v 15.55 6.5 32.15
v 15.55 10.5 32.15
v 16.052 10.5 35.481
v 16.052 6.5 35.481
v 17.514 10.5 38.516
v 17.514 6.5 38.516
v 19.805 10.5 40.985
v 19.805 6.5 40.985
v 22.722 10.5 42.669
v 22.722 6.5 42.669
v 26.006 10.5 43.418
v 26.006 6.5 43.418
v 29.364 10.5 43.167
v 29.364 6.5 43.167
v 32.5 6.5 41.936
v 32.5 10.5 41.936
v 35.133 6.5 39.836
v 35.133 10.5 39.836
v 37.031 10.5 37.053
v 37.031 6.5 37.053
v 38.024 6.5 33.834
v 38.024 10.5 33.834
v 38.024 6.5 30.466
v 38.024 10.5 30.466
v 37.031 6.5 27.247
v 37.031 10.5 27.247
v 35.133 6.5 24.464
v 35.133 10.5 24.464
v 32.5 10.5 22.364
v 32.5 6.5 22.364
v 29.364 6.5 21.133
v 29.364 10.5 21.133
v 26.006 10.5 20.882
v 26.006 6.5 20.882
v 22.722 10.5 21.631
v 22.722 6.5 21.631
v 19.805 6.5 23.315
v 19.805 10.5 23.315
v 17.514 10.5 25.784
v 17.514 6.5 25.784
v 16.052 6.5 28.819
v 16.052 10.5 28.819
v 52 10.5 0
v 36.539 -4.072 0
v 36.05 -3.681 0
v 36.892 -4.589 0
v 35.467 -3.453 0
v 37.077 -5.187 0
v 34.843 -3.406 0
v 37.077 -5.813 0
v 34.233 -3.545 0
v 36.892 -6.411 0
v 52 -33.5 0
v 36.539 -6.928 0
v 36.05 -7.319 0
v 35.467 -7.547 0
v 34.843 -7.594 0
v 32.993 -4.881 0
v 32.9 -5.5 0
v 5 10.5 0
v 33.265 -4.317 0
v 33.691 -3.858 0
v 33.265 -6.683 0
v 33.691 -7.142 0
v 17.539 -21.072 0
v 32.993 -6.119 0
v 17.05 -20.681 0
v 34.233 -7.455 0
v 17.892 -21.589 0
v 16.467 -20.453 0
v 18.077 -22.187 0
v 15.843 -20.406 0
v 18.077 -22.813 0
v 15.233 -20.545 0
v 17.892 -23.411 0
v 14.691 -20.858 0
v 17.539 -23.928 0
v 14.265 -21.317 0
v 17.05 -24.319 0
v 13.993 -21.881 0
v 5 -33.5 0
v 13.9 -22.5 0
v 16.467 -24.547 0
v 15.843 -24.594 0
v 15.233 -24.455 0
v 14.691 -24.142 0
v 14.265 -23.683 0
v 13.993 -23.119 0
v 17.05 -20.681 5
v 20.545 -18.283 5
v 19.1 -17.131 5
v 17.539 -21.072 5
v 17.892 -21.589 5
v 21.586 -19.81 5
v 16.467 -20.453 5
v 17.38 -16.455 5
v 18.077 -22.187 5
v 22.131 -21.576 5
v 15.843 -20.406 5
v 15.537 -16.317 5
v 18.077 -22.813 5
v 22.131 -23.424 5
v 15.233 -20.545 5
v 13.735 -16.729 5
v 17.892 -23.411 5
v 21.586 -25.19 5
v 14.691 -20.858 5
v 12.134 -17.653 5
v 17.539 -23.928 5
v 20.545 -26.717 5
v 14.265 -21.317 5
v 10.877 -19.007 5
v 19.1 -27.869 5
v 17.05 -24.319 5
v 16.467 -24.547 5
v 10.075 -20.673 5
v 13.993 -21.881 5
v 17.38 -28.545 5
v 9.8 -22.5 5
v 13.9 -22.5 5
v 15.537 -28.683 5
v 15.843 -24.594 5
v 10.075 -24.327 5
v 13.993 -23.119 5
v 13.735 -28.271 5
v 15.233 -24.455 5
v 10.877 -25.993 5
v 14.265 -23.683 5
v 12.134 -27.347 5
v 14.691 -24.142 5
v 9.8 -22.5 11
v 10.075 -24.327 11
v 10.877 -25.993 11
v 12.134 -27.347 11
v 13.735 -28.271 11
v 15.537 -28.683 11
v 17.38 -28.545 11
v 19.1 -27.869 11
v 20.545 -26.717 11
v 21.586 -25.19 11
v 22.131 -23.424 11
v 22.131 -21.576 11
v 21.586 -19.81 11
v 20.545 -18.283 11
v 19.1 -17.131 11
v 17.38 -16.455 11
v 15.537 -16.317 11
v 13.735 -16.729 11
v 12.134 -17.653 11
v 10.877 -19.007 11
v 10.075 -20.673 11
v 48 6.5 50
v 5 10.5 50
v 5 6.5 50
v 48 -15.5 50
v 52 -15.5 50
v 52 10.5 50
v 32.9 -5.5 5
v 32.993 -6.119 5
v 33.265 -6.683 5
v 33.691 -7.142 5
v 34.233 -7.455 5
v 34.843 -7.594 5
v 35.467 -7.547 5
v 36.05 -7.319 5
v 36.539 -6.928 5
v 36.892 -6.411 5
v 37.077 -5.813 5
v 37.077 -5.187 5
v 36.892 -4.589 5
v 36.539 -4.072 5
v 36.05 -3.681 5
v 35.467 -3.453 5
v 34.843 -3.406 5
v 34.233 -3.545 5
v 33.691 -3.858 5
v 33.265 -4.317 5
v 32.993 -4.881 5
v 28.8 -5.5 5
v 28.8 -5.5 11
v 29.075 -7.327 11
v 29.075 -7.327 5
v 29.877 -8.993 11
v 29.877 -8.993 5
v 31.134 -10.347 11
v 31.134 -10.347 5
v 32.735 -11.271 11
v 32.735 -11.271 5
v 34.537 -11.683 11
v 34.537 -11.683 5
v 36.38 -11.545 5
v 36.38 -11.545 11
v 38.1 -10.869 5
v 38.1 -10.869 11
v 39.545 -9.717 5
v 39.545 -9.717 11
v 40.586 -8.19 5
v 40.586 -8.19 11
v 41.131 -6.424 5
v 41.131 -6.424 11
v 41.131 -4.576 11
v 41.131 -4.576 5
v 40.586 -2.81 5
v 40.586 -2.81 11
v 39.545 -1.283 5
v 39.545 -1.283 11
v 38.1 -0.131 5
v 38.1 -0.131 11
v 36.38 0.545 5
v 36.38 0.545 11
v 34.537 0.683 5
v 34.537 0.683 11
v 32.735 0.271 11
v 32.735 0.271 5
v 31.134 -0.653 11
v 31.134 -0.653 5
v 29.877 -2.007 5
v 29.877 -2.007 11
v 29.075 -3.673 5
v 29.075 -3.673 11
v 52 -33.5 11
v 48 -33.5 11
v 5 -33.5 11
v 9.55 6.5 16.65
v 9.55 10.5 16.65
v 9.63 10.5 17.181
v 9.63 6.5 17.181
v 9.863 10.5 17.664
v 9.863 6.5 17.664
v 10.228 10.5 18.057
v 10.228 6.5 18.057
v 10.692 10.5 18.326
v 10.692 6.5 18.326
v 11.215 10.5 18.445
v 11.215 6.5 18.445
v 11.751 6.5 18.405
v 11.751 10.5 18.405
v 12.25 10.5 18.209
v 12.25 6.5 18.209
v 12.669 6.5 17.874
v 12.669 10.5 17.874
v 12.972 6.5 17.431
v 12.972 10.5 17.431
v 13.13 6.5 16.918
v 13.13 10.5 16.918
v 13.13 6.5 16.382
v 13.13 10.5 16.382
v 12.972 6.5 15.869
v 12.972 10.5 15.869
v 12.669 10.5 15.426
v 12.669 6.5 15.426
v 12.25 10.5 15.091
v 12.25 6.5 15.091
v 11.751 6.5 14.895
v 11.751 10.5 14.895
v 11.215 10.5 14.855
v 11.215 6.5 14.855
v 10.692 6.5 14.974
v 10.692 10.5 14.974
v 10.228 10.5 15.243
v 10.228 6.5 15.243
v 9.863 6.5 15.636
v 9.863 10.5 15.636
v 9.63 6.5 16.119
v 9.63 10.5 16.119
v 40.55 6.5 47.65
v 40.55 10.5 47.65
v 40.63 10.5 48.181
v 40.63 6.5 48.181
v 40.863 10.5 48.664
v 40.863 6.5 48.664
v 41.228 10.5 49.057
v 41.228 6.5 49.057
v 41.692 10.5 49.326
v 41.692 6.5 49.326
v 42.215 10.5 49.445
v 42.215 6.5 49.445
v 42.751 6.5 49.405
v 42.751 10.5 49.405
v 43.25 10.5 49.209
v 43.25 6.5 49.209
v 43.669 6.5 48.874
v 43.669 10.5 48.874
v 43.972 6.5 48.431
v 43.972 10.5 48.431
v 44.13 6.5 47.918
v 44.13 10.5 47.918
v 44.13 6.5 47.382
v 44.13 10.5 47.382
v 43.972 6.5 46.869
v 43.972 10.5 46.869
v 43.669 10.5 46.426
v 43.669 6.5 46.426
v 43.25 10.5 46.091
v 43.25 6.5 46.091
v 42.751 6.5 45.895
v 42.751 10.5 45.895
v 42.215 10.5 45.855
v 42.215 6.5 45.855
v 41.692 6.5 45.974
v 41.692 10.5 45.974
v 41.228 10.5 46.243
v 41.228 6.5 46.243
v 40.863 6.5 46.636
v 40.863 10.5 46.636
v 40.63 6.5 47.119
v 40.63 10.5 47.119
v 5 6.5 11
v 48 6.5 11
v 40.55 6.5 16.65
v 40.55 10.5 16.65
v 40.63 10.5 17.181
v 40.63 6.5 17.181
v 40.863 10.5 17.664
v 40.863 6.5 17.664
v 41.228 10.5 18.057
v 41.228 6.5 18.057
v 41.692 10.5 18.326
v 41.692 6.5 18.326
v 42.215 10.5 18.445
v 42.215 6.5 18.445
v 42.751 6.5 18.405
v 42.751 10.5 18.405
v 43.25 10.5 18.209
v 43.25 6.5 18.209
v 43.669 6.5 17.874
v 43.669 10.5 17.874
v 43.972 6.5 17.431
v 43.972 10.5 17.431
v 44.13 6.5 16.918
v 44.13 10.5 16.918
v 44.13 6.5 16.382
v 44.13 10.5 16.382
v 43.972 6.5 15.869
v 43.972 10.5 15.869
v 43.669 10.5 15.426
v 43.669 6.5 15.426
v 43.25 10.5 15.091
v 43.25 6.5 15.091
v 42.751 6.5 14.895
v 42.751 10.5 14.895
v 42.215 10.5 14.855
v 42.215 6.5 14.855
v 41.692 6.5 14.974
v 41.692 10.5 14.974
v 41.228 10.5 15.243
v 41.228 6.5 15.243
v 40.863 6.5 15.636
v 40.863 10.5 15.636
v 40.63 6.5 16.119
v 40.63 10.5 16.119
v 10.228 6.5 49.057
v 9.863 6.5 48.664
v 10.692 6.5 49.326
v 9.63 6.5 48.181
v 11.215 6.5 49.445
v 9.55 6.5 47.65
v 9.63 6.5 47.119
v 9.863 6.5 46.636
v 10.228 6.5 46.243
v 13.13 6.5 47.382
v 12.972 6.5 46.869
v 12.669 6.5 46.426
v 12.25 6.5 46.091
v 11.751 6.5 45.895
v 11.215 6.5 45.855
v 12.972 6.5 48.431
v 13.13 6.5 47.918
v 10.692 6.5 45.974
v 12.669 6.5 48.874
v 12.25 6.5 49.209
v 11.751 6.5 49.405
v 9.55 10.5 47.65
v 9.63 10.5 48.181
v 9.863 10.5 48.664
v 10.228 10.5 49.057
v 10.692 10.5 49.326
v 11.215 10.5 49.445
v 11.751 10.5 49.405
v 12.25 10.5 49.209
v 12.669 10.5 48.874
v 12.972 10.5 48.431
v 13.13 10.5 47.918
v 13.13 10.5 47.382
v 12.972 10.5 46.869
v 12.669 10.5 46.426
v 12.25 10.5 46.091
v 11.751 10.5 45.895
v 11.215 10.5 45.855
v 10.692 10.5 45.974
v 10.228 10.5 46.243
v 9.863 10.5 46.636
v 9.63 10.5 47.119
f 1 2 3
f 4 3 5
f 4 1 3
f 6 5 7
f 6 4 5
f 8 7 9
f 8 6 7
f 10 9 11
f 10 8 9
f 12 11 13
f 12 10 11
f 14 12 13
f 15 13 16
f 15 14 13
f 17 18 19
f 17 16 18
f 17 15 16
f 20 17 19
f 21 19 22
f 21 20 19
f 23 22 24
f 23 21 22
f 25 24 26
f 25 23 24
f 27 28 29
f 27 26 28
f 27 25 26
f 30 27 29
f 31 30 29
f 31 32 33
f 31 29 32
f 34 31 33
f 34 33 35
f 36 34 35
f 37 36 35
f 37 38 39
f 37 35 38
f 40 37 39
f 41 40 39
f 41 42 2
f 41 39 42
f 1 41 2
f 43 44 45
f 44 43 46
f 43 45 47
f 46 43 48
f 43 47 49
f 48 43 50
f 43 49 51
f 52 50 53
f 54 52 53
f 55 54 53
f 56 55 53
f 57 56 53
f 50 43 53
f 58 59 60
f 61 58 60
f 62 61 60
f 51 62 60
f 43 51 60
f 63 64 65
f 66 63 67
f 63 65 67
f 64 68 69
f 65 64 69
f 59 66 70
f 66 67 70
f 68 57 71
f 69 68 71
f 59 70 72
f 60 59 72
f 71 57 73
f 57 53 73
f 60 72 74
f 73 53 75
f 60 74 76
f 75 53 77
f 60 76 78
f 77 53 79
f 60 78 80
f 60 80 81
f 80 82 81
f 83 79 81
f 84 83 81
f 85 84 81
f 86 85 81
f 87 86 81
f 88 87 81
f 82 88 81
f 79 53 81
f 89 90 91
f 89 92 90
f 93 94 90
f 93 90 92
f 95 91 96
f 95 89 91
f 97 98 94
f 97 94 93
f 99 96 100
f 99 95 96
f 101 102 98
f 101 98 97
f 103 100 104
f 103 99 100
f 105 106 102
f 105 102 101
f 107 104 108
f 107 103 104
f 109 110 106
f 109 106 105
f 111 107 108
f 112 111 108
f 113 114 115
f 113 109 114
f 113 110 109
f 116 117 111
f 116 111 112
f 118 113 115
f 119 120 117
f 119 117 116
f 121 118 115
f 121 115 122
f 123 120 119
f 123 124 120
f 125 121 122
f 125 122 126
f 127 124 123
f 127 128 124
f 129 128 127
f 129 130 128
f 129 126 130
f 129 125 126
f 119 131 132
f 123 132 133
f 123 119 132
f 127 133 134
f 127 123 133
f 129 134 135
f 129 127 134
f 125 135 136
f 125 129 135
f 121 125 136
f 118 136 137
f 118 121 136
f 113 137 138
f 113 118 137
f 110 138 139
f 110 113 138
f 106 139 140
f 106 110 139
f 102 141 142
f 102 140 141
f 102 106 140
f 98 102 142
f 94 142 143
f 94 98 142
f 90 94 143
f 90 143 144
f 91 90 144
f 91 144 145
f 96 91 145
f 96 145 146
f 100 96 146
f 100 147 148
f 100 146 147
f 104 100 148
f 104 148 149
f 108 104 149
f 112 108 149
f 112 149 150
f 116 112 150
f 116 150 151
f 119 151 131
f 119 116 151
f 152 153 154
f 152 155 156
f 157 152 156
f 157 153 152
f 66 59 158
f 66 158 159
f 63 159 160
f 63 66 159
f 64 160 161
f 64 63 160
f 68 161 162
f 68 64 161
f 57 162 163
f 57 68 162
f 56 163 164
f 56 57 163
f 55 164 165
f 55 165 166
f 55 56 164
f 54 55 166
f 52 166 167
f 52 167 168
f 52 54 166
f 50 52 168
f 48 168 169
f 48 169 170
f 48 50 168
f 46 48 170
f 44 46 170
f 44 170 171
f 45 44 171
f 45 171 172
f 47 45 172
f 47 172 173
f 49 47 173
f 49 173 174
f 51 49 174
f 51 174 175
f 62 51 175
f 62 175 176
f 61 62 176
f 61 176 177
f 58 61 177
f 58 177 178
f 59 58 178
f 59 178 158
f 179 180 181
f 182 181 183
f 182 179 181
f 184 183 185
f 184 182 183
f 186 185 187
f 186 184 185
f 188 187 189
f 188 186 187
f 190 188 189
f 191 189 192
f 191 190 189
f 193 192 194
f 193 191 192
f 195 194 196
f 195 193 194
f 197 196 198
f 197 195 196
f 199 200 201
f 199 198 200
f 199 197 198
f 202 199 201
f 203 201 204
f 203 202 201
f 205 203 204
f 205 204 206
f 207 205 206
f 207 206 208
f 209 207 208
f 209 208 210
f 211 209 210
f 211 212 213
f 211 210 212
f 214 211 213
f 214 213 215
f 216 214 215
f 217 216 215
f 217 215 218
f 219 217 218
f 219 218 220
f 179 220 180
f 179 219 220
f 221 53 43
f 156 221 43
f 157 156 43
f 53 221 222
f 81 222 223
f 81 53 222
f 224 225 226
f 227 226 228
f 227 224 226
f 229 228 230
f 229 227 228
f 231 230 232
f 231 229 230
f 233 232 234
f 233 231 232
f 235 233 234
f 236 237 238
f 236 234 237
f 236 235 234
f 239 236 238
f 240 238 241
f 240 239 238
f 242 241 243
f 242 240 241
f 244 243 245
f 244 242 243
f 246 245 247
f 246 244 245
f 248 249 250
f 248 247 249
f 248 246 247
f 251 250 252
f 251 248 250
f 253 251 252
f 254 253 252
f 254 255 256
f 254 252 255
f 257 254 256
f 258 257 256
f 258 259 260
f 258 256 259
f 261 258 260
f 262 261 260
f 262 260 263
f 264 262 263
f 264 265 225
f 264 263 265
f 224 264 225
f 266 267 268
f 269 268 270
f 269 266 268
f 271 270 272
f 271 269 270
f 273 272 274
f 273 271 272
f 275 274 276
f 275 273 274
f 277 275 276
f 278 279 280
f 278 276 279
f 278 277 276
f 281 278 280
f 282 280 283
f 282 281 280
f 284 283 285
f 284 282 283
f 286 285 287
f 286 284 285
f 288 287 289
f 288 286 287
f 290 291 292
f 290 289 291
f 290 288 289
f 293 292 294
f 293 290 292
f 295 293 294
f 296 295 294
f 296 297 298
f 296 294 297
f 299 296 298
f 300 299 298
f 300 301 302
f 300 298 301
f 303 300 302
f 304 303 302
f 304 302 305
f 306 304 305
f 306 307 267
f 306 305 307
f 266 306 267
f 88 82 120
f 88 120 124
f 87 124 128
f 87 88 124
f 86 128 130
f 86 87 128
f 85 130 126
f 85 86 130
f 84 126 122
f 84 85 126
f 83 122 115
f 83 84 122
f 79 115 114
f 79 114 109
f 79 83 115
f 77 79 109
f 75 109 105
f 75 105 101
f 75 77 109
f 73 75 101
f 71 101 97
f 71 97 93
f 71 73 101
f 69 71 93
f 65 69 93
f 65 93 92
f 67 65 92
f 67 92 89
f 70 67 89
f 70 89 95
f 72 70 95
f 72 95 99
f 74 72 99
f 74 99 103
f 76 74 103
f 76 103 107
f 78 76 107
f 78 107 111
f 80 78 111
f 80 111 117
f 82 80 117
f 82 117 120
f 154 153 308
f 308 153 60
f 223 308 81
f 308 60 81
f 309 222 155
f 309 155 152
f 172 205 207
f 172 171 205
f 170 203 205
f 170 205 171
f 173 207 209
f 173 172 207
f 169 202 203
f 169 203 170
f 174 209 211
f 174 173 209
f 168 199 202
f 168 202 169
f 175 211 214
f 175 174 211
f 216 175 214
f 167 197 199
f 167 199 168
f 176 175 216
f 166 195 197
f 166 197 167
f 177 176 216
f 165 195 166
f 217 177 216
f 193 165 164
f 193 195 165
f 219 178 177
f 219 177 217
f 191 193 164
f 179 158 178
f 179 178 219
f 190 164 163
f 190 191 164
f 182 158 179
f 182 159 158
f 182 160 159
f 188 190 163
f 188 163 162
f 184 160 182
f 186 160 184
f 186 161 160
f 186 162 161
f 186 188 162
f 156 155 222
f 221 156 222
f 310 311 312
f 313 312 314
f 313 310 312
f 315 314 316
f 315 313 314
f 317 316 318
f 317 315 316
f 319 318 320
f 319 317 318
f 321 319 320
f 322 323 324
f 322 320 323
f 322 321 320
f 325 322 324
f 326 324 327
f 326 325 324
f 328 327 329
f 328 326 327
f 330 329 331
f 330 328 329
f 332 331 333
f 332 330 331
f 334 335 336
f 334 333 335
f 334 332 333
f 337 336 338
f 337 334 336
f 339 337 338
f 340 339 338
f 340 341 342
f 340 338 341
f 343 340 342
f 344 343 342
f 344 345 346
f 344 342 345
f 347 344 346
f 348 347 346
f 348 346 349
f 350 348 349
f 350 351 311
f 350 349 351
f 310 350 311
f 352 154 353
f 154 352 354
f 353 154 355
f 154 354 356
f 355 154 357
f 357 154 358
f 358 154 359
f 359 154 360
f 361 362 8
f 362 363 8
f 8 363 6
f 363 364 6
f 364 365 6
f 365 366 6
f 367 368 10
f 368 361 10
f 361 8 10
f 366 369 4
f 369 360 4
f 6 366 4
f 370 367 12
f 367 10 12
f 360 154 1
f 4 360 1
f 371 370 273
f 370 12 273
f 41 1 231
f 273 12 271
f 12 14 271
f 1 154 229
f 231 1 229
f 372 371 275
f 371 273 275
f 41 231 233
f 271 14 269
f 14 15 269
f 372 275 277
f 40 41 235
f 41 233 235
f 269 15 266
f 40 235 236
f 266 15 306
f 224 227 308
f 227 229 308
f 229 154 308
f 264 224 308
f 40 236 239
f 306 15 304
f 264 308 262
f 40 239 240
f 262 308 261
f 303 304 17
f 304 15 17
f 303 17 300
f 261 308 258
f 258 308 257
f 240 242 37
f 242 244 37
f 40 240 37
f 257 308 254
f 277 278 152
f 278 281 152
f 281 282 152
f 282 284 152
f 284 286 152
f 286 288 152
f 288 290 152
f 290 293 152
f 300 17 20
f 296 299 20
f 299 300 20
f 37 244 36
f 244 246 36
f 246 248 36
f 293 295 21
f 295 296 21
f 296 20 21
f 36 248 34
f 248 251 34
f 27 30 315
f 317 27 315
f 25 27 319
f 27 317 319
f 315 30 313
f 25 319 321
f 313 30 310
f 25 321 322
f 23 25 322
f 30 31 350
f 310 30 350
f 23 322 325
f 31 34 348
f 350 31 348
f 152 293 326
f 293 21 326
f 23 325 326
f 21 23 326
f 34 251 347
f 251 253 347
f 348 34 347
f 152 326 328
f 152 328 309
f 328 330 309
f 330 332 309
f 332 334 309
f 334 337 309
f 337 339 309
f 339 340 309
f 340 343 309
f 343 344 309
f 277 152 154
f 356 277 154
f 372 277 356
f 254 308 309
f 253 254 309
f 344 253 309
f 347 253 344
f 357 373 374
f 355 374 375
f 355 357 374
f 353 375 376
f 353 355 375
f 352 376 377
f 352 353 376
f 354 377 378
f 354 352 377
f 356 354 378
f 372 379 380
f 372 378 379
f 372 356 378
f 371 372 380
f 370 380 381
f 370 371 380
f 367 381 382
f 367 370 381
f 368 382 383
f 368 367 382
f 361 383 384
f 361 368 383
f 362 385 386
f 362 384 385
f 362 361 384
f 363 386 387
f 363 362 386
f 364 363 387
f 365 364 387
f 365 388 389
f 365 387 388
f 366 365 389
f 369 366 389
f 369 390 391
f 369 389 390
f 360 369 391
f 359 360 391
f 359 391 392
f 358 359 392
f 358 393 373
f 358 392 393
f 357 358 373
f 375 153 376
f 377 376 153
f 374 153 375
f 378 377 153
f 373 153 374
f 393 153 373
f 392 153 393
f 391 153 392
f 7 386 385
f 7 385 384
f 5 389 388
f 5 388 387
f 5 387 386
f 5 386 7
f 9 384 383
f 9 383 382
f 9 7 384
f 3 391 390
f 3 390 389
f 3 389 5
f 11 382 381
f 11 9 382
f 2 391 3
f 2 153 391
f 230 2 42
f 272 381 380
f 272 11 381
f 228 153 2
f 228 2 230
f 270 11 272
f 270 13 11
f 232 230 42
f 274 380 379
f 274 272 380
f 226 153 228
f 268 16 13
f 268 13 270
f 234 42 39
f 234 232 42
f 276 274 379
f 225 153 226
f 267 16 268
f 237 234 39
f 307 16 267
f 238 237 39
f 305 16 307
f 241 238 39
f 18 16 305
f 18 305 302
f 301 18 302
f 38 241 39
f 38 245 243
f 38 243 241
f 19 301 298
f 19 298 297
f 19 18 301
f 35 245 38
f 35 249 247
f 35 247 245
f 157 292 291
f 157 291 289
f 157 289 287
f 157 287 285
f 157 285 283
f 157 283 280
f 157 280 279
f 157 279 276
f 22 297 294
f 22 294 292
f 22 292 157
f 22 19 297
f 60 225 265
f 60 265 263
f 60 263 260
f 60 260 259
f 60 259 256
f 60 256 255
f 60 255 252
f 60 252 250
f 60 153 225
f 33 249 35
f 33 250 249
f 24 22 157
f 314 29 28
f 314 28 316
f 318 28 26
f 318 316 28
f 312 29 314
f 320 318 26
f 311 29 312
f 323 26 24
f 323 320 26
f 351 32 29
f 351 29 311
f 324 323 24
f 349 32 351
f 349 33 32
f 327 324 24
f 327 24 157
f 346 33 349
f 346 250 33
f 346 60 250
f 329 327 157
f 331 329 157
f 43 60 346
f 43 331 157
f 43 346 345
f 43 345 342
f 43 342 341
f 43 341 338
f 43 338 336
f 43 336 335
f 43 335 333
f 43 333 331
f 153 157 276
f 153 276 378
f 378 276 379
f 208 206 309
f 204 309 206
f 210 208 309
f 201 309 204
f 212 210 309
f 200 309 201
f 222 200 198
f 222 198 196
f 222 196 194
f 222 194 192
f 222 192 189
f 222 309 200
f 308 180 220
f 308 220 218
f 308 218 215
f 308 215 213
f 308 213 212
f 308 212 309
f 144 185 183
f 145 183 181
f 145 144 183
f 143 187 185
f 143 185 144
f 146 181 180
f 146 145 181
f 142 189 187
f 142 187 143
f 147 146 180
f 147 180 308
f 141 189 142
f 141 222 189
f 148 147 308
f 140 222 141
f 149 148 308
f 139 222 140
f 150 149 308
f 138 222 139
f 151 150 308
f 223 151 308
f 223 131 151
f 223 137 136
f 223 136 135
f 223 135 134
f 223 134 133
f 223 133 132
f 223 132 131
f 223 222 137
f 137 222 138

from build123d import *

# Parameters (mm, degrees)
CYLINDER108_R          = 1.8
CYLINDER108_DEPTH      = 10
CYLINDER111_R          = 1.8
CYLINDER111_DEPTH      = 10
CYLINDER109_R          = 1.8
CYLINDER109_DEPTH      = 10
CYLINDER110_R          = 1.8
CYLINDER110_DEPTH      = 10
CYLINDER106_R          = 2.5
CYLINDER106_DEPTH      = 24
CYLINDER107_R          = 11.3
CYLINDER107_DEPTH      = 6
BOX038_W               = 42.3
BOX038_H               = 39.8
BOX038_DEPTH           = 42.3
CYLINDER102_R          = 6.2
CYLINDER102_DEPTH      = 30
CYLINDER103_R          = 2.1
CYLINDER103_DEPTH      = 10
CYLINDER104_R          = 6.2
CYLINDER104_DEPTH      = 30
CYLINDER105_R          = 2.1
CYLINDER105_DEPTH      = 10
BOX037_W               = 47
BOX037_H               = 4
BOX037_DEPTH           = 50
BOX036_W               = 43
BOX036_H               = 40
BOX036_DEPTH           = 11
EXTRUDE_DEPTH          = 4
CUT097_PLACEMENT_ANGLE = 180


with BuildPart() as cylinder108:
    # Cylinder108 → Cylinder108 (new body)
    with BuildSketch(Plane(origin=(5.65, 0, 36.65), x_dir=(1, 0, 0), z_dir=(0, -1, 0))):
        Circle(CYLINDER108_R)
    extrude(amount=CYLINDER108_DEPTH)


with BuildPart() as cylinder111:
    # Cylinder111 → Cylinder111 (new body)
    with BuildSketch(Plane(origin=(36.65, 0, 36.65), x_dir=(1, 0, 0), z_dir=(0, -1, 0))):
        Circle(CYLINDER111_R)
    extrude(amount=CYLINDER111_DEPTH)


with BuildPart() as cylinder109:
    # Cylinder109 → Cylinder109 (new body)
    with BuildSketch(Plane(origin=(5.65, 0, 5.65), x_dir=(1, 0, 0), z_dir=(0, -1, 0))):
        Circle(CYLINDER109_R)
    extrude(amount=CYLINDER109_DEPTH)


with BuildPart() as cylinder110:
    # Cylinder110 → Cylinder110 (new body)
    with BuildSketch(Plane(origin=(36.65, 0, 5.65), x_dir=(1, 0, 0), z_dir=(0, -1, 0))):
        Circle(CYLINDER110_R)
    extrude(amount=CYLINDER110_DEPTH)


with BuildPart() as cylinder106:
    # Cylinder106 → Cylinder106 (new body)
    with BuildSketch(Plane(origin=(21.15, -2, 21.15), x_dir=(1, 0, 0), z_dir=(0, -1, 0))):
        Circle(CYLINDER106_R)
    extrude(amount=CYLINDER106_DEPTH)


with BuildPart() as cylinder107:
    # Cylinder107 → Cylinder107 (new body)
    with BuildSketch(Plane(origin=(21.15, 0, 21.15), x_dir=(1, 0, 0), z_dir=(0, -1, 0))):
        Circle(CYLINDER107_R)
    extrude(amount=CYLINDER107_DEPTH)


with BuildPart() as fusion050:
    # Box038 → Box038 (new body)
    with BuildSketch(Plane.XY):
        with Locations((21.15, 19.9)):
            Rectangle(BOX038_W, BOX038_H)
    extrude(amount=BOX038_DEPTH)

    # Fusion048: union Cylinder107
    add(cylinder107.part)

    # Fusion049: union Cylinder106
    add(cylinder106.part)

    # Fusion050: union Cylinder108, Cylinder111, Cylinder109, Cylinder110
    add(cylinder108.part)
    add(cylinder111.part)
    add(cylinder109.part)
    add(cylinder110.part)


with BuildPart() as fusion050_1:
    # Fusion050 placement: moved
    add(fusion050.part.moved(Location((9, 0, 11))))


with BuildPart() as cylinder102:
    # Cylinder102 → Cylinder102 (new body)
    with BuildSketch(Plane.XY.offset(10)):
        Circle(CYLINDER102_R)
    extrude(amount=CYLINDER102_DEPTH)


with BuildPart() as fusion046:
    # Cylinder103 → Cylinder103 (new body)
    with BuildSketch(Plane.XY):
        Circle(CYLINDER103_R)
    extrude(amount=CYLINDER103_DEPTH)

    # Fusion046: union Cylinder102
    add(cylinder102.part)


with BuildPart() as fusion046_1:
    # Fusion046 placement: moved
    add(fusion046.part.moved(Location((22, 12, -5))))


with BuildPart() as cylinder104:
    # Cylinder104 → Cylinder104 (new body)
    with BuildSketch(Plane.XY.offset(10)):
        Circle(CYLINDER104_R)
    extrude(amount=CYLINDER104_DEPTH)


with BuildPart() as fusion047:
    # Cylinder105 → Cylinder105 (new body)
    with BuildSketch(Plane.XY):
        Circle(CYLINDER105_R)
    extrude(amount=CYLINDER105_DEPTH)

    # Fusion047: union Cylinder104
    add(cylinder104.part)


with BuildPart() as fusion047_1:
    # Fusion047 placement: moved
    add(fusion047.part.moved(Location((41, 29, -5))))


with BuildPart() as box037:
    # Box037 → Box037 (new body)
    with BuildSketch(Plane(origin=(52, 0, 0), x_dir=(-1, 0, 0), z_dir=(0, 0, 1))):
        with Locations((23.5, 2)):
            Rectangle(BOX037_W, BOX037_H)
    extrude(amount=BOX037_DEPTH)


with BuildPart() as box036:
    # Box036 → Box036 (new body)
    with BuildSketch(Plane(origin=(9, 0, 0), x_dir=(1, 0, 0), z_dir=(0, 0, 1))):
        with Locations((21.5, 20)):
            Rectangle(BOX036_W, BOX036_H)
    extrude(amount=BOX036_DEPTH)


with BuildPart() as nema_cronstain:
    # Sketch024 → Extrude (new body)
    with BuildSketch(Plane.YZ):
        Polygon((0, 0), (0, 50), (22, 50), (40, 11), (40, 0), align=None)
    extrude(amount=-EXTRUDE_DEPTH)


with BuildPart() as nema_cronstain_1:
    # Extrude placement: moved
    add(nema_cronstain.part.moved(Location((9, 0, 0))))

    # Fusion045: union Box037, Box036
    add(box037.part)
    add(box036.part)

    # Cut095: cut Fusion047
    add(fusion047_1.part, mode=Mode.SUBTRACT)

    # Cut096: cut Fusion046
    add(fusion046_1.part, mode=Mode.SUBTRACT)

    # Cut097: cut Fusion050
    add(fusion050_1.part, mode=Mode.SUBTRACT)


with BuildPart() as nema_cronstain_2:
    # Cut097 placement: moved
    add(nema_cronstain_1.part.moved(Location((57, 6.5, 0))).rotate(Axis((57, 6.5, 0), (0, 0, 1)), CUT097_PLACEMENT_ANGLE))


solid = nema_cronstain_2.part
